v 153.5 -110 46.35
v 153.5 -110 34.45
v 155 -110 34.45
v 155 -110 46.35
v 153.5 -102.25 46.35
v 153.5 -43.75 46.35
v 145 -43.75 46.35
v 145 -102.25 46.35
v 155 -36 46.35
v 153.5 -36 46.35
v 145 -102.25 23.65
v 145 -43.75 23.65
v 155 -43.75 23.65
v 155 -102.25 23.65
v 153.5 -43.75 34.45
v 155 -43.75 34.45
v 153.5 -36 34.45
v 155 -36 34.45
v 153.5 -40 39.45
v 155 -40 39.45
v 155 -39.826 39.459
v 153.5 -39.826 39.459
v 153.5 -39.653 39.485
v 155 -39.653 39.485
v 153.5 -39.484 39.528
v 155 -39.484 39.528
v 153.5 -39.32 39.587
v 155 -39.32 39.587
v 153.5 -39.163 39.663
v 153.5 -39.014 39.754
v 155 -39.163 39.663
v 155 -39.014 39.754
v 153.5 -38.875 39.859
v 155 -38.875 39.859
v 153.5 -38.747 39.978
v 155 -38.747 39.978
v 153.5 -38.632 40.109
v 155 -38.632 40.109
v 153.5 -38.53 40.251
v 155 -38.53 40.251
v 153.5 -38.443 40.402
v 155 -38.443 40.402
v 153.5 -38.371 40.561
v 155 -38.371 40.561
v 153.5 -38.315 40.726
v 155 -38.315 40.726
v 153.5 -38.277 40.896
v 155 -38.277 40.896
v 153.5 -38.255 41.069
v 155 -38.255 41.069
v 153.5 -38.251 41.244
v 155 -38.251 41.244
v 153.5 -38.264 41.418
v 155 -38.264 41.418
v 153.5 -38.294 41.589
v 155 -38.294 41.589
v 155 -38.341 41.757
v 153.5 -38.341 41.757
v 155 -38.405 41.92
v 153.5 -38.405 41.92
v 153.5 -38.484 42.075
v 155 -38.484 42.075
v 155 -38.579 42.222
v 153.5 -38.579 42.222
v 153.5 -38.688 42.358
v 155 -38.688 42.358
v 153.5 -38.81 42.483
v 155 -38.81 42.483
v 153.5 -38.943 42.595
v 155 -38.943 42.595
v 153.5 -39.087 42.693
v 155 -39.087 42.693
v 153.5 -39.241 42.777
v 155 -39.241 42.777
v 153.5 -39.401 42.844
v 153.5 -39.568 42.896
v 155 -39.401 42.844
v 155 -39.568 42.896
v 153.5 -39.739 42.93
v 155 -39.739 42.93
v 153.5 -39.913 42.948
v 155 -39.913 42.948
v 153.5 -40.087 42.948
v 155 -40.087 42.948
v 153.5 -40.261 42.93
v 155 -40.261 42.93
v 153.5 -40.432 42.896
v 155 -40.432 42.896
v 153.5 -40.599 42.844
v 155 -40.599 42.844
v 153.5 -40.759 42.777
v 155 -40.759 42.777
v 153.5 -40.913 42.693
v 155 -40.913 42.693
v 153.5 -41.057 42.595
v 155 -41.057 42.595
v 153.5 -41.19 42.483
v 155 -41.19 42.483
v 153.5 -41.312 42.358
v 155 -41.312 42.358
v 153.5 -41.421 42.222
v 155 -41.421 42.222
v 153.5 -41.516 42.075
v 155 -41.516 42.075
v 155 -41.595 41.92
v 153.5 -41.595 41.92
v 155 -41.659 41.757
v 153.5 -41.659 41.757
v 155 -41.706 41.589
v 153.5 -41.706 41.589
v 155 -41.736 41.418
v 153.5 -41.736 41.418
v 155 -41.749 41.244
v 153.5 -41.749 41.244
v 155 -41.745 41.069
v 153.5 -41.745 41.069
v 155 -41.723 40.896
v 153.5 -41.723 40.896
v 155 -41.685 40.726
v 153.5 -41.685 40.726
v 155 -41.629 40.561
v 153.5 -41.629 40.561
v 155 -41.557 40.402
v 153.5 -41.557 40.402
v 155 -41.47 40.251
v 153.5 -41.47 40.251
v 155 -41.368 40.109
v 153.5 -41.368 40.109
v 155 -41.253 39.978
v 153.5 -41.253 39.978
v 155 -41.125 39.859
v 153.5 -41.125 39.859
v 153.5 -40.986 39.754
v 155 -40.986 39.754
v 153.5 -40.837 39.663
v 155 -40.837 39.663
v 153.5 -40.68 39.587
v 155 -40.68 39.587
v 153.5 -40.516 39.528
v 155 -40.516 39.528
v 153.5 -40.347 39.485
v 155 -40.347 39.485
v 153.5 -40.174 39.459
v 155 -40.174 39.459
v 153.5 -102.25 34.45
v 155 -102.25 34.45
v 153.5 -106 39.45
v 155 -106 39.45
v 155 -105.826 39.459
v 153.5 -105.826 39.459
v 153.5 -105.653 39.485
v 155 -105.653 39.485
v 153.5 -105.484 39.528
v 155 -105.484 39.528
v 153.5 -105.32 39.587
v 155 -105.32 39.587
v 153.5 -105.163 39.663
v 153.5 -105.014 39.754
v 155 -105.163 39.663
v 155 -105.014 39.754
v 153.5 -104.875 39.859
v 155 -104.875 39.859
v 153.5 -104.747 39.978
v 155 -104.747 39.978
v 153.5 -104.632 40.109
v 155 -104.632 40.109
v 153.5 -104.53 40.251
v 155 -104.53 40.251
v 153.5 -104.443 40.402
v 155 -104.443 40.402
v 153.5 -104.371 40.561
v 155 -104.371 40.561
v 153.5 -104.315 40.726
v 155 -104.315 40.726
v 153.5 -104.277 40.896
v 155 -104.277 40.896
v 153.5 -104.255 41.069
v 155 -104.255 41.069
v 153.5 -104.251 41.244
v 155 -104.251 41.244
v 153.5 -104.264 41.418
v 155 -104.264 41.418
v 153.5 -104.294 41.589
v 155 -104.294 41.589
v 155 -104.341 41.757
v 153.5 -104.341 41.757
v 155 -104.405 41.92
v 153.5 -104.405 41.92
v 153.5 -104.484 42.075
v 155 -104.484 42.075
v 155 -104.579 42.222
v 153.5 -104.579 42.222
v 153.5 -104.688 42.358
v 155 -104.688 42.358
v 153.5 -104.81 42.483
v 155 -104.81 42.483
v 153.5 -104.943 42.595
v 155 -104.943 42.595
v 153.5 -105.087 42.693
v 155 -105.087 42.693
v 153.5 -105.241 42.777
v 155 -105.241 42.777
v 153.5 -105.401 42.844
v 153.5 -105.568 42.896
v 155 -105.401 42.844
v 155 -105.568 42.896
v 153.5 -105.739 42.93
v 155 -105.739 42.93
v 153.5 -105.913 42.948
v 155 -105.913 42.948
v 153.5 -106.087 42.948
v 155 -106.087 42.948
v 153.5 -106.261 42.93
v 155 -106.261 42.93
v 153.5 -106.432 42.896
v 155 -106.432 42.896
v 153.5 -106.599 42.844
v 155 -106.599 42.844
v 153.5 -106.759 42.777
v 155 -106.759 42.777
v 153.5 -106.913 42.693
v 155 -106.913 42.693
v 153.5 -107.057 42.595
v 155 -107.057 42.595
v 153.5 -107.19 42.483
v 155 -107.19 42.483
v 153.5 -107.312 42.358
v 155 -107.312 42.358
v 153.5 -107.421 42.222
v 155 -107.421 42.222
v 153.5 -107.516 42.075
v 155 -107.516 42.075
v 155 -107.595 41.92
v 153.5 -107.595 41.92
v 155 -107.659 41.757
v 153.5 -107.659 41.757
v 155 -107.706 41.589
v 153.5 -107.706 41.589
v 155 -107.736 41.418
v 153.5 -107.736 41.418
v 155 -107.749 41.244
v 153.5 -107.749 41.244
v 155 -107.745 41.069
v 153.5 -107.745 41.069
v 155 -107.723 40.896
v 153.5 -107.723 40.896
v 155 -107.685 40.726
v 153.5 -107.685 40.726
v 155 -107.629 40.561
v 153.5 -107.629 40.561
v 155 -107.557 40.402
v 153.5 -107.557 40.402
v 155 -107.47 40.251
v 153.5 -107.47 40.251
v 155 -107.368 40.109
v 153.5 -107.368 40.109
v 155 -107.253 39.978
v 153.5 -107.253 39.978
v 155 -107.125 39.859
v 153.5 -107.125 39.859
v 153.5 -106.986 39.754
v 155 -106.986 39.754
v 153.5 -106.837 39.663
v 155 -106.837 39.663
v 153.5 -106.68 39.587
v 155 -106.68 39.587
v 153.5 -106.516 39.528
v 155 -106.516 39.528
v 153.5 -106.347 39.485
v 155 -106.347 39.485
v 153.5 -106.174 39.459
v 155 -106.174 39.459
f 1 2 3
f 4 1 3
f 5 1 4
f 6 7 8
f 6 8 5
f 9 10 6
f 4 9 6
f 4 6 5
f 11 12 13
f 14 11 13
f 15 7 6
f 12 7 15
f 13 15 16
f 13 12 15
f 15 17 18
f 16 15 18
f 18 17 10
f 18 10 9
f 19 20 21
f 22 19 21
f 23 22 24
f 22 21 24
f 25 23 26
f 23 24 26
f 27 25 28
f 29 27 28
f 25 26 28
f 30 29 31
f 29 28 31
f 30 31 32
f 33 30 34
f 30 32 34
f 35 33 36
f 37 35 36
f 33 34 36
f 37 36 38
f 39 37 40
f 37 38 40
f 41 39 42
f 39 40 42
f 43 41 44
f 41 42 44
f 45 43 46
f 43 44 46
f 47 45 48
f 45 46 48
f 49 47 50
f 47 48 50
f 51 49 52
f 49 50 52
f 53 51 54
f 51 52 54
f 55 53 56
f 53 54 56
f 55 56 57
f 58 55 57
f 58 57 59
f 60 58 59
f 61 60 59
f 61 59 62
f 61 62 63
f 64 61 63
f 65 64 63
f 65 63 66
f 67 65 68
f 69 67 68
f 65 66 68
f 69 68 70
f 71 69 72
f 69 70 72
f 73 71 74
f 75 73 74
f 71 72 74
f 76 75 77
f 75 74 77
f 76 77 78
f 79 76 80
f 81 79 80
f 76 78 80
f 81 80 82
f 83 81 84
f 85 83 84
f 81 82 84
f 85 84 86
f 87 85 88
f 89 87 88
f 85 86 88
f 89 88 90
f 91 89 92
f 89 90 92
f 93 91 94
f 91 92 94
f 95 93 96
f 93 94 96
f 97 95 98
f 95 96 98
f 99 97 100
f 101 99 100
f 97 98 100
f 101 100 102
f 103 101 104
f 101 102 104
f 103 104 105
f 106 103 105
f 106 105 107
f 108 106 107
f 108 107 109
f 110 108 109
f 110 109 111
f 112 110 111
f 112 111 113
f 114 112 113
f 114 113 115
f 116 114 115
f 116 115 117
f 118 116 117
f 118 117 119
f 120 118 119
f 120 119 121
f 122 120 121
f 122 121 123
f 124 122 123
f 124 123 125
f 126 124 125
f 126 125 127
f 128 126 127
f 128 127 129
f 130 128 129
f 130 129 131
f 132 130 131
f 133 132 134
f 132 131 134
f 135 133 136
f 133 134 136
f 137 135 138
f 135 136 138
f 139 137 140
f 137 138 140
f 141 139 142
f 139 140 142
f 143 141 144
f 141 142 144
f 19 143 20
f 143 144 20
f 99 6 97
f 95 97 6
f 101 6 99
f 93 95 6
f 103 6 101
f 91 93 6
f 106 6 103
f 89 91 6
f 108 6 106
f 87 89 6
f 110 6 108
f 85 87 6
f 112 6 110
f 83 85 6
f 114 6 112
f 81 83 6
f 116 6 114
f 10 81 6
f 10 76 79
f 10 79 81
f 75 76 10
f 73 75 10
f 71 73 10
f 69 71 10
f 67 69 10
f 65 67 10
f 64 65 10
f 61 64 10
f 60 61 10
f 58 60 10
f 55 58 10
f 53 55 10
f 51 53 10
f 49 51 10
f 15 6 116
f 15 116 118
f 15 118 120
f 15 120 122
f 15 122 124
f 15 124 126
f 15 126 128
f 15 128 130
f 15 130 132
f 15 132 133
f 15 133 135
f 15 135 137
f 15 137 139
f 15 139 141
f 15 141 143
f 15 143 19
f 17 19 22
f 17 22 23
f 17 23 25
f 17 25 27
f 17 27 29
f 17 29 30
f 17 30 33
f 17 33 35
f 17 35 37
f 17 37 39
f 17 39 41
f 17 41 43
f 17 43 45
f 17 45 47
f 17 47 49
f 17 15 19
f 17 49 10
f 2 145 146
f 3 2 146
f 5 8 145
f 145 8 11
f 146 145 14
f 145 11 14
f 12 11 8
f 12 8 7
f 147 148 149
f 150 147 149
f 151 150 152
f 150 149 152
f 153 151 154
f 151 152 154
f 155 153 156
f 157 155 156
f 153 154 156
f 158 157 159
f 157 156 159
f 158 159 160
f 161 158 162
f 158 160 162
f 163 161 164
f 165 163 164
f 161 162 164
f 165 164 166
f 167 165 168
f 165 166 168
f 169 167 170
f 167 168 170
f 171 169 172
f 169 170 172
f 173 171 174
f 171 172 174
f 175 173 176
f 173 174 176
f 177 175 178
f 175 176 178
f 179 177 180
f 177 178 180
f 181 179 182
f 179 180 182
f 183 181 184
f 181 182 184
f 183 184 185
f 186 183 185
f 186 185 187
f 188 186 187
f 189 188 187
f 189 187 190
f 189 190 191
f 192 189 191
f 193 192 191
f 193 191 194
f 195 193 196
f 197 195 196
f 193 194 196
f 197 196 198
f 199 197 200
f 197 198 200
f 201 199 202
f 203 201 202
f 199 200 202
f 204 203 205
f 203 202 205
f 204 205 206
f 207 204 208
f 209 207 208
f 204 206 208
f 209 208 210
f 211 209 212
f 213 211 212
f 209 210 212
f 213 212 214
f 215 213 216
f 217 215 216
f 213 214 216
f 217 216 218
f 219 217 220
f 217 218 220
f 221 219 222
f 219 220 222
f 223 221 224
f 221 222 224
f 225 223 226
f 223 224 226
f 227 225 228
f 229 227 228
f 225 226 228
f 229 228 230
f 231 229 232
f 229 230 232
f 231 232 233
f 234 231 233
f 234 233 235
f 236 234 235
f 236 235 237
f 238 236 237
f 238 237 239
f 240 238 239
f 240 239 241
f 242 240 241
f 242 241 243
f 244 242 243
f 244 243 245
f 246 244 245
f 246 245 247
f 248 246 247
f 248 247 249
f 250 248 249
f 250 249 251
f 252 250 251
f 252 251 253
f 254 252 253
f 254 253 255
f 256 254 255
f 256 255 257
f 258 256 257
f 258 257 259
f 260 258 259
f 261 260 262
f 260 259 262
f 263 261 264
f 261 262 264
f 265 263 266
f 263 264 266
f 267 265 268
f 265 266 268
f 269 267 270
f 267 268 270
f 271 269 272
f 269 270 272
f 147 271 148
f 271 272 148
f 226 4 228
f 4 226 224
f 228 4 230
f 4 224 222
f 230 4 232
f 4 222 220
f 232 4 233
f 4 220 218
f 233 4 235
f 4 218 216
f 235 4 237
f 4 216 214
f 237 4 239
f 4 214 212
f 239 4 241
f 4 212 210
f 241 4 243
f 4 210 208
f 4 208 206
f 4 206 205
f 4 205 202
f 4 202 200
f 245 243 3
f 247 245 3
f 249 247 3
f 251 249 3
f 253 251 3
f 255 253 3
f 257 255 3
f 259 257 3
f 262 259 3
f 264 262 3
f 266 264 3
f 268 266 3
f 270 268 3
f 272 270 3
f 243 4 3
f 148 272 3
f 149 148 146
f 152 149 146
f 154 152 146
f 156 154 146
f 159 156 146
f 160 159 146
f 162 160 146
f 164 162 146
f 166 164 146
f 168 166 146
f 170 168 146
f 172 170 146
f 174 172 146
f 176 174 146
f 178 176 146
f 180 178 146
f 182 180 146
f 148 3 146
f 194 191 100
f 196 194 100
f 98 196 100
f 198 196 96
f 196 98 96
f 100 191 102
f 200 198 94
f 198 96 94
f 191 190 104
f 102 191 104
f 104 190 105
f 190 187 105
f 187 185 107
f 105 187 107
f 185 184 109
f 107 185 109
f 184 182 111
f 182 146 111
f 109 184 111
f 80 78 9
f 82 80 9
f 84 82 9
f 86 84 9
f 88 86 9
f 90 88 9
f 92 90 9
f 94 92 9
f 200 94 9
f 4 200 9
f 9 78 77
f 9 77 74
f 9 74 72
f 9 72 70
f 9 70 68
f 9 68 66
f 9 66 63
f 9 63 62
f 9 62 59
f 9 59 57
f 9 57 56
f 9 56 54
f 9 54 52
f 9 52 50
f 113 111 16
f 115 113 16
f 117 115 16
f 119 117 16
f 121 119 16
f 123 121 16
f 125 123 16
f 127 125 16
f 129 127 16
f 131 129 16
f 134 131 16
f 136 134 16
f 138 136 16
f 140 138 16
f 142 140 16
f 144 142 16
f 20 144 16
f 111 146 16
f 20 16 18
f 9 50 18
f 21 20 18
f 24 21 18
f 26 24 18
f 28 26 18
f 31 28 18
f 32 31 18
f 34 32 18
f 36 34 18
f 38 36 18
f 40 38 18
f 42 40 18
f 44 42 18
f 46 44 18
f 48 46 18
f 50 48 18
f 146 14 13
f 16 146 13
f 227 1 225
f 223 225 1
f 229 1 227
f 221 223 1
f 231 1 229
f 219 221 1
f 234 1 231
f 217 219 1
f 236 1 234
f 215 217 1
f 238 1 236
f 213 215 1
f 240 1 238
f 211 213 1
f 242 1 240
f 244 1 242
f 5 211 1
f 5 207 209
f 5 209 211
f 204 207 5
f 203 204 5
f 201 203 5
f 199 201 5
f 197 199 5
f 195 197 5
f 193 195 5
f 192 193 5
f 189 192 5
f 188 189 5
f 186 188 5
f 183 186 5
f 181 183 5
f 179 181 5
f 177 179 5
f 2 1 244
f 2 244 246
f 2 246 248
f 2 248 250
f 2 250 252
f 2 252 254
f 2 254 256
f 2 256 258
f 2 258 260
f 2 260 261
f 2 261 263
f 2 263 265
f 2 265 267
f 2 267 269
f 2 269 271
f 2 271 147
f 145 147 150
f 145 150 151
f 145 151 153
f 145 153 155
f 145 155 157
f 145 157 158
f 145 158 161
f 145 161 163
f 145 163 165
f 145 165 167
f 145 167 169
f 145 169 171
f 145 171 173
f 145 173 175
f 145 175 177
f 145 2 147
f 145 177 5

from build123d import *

# Parameters (mm, degrees)
V09_SPEAKER_BODY58P5X22P7X10_START = 23.65
SKETCH_2_W                         = 10
SKETCH_2_H                         = 58.5
V09_SPEAKER_BODY58P5X22P7X10_DEPTH = 22.7
V09_SPEAKER_LOWER_EAR_START        = 34.45
SKETCH_3_W                         = 1.5
SKETCH_3_H                         = 7.75
V09_SPEAKER_LOWER_EAR_DEPTH        = 11.9
V09_SPEAKER_UPPER_EAR_START        = 34.45
SKETCH_4_W                         = 1.5
SKETCH_4_H                         = 7.75
V09_SPEAKER_UPPER_EAR_DEPTH        = 11.9
SKETCH_5_R                         = 1.75
V09_SPEAKER_EAR_D3P5_PITCH66_DEPTH = 1.5


with BuildPart() as part:
    # 草图2 → V09_Speaker_body58p5x22p7x10 (new body)
    with BuildSketch(Plane.XY.offset(V09_SPEAKER_BODY58P5X22P7X10_START)):
        with Locations((150, -73)):
            Rectangle(SKETCH_2_W, SKETCH_2_H)
    extrude(amount=V09_SPEAKER_BODY58P5X22P7X10_DEPTH)

    # 草图3 → V09_Speaker_lower_ear (add)
    with BuildSketch(Plane.XY.offset(V09_SPEAKER_LOWER_EAR_START)):
        with Locations((154.25, -106.125)):
            Rectangle(SKETCH_3_W, SKETCH_3_H)
    extrude(amount=V09_SPEAKER_LOWER_EAR_DEPTH)

    # 草图4 → V09_Speaker_upper_ear (add)
    with BuildSketch(Plane.XY.offset(V09_SPEAKER_UPPER_EAR_START)):
        with Locations((154.25, -39.875)):
            Rectangle(SKETCH_4_W, SKETCH_4_H)
    extrude(amount=V09_SPEAKER_UPPER_EAR_DEPTH)

    # 草图5 → V09_Speaker_ear_D3p5_pitch66 (cut)
    with BuildSketch(Plane(origin=(155, 0, 0), x_dir=(0, 0, -1), z_dir=(1, 0, 0))):
        with Locations((-41.2, -106)):
            Circle(SKETCH_5_R)
        with Locations((-41.2, -40)):
            Circle(SKETCH_5_R)
    extrude(amount=-V09_SPEAKER_EAR_D3P5_PITCH66_DEPTH, mode=Mode.SUBTRACT)


solid = part.part
